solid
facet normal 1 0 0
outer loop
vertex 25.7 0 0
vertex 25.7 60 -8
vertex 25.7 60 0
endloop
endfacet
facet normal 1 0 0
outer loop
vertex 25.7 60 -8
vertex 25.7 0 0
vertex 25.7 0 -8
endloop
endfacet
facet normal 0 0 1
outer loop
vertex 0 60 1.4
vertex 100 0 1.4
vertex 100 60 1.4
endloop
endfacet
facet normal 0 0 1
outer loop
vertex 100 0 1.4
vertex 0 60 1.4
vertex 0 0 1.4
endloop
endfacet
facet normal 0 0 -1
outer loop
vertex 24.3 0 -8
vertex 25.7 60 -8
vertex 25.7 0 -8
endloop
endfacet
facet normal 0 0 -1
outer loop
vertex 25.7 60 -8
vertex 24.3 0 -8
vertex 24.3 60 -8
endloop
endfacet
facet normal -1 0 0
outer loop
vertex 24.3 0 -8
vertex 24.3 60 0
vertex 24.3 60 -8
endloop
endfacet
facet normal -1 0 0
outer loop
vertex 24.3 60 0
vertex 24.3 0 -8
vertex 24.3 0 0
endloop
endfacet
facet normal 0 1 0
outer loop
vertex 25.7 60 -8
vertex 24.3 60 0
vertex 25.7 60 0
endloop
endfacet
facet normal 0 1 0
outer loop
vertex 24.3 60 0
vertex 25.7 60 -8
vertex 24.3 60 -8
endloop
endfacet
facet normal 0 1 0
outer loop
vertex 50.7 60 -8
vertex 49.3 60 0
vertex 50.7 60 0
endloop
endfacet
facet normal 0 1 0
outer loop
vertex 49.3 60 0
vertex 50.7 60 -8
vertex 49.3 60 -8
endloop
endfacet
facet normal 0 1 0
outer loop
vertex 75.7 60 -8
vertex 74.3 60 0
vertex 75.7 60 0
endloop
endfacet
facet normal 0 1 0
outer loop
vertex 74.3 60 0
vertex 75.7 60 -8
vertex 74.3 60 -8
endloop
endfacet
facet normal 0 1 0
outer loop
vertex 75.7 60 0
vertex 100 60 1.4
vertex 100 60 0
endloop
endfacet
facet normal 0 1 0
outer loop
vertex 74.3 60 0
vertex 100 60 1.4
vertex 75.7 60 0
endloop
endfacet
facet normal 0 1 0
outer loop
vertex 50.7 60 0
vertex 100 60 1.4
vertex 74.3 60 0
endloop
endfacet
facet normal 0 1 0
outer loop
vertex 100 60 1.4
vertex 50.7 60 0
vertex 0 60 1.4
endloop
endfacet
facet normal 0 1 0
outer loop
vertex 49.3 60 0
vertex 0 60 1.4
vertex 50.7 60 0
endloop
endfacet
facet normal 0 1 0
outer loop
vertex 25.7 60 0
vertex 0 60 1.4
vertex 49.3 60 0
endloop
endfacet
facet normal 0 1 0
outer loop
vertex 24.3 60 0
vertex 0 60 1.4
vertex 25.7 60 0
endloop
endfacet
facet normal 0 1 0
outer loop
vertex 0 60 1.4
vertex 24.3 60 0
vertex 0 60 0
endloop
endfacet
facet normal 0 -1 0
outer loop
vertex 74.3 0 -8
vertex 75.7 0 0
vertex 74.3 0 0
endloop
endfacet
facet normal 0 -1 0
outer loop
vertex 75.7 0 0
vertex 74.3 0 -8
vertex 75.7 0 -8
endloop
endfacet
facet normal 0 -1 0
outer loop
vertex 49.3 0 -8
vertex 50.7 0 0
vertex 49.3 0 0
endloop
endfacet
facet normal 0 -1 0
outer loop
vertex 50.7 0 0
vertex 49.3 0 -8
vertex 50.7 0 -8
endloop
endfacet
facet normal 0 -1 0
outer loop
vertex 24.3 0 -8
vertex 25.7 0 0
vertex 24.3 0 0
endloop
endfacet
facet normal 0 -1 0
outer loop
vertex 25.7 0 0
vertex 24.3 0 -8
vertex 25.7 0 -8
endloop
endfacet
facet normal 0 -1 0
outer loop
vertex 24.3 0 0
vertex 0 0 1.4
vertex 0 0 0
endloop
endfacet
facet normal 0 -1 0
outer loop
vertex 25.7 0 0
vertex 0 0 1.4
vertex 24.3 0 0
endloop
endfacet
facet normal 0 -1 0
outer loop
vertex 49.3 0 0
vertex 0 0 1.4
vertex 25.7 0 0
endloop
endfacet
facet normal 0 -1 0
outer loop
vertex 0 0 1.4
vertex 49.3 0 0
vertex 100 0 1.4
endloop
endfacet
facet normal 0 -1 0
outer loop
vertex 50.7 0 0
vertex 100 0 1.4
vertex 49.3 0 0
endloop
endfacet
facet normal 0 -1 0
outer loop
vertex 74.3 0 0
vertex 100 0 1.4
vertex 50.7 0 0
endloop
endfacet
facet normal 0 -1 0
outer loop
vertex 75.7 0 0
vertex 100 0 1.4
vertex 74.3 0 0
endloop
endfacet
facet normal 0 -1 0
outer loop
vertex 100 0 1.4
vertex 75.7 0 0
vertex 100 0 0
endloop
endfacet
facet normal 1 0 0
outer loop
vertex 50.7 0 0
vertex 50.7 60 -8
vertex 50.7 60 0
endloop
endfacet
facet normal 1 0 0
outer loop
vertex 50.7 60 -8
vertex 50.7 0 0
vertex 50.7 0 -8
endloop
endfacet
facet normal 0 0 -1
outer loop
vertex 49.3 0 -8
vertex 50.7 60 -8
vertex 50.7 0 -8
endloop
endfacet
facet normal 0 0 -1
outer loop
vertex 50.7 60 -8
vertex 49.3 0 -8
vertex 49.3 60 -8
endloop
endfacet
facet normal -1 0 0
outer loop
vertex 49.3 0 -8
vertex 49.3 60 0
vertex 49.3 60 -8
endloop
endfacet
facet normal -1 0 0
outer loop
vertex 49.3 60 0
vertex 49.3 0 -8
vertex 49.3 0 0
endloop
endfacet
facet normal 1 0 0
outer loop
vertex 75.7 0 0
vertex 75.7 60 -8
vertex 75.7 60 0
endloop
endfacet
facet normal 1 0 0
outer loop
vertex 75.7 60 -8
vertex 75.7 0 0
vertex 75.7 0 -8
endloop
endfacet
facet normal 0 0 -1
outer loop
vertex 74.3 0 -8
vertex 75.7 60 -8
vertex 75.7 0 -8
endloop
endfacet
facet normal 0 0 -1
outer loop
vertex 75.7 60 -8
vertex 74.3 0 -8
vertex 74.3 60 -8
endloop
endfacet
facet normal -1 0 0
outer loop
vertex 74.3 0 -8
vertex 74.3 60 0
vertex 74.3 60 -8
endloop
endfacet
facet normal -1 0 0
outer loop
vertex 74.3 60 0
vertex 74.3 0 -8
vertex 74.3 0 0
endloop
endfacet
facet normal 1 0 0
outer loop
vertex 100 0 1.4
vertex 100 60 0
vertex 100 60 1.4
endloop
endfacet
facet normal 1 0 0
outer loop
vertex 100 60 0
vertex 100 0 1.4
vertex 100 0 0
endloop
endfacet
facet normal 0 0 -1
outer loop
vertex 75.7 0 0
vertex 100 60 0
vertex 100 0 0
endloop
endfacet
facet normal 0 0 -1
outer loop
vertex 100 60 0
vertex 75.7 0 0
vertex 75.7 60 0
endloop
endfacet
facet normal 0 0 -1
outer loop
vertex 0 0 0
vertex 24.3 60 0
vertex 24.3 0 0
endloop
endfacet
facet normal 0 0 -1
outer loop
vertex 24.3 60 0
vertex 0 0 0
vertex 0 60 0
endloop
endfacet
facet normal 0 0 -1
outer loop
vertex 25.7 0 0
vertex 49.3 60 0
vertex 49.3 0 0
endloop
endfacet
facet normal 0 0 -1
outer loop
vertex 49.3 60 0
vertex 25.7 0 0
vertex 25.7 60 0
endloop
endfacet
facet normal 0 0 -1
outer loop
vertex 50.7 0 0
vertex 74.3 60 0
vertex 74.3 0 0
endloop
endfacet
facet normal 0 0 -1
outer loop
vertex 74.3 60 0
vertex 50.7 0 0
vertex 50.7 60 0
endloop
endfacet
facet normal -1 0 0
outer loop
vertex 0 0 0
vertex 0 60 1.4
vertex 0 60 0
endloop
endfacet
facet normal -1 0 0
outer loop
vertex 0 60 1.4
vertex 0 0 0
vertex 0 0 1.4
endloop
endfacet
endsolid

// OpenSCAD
$fn = 32;

// ----------------------------------------------------------------------
// Ribbed panel: 1.4 mm panel
// ----------------------------------------------------------------------

// --- parameters (mm) ---
panel_l = 100;            // panel length, X
panel_w = 60;             // panel width, Y
panel_t = 1.4;            // panel thickness, Z
rib_t = 1.4;              // rib thickness
rib_h = 8;                // rib height below the panel
ribs = 3;                 // number of ribs

total_h = panel_t + rib_h;  // overall height

union() {
  cube([panel_l, panel_w, panel_t]);
  for (i = [1 : ribs])
    translate([i * panel_l / (ribs + 1) - rib_t / 2, 0, -rib_h])
      cube([rib_t, panel_w, rib_h + panel_t]);
}
